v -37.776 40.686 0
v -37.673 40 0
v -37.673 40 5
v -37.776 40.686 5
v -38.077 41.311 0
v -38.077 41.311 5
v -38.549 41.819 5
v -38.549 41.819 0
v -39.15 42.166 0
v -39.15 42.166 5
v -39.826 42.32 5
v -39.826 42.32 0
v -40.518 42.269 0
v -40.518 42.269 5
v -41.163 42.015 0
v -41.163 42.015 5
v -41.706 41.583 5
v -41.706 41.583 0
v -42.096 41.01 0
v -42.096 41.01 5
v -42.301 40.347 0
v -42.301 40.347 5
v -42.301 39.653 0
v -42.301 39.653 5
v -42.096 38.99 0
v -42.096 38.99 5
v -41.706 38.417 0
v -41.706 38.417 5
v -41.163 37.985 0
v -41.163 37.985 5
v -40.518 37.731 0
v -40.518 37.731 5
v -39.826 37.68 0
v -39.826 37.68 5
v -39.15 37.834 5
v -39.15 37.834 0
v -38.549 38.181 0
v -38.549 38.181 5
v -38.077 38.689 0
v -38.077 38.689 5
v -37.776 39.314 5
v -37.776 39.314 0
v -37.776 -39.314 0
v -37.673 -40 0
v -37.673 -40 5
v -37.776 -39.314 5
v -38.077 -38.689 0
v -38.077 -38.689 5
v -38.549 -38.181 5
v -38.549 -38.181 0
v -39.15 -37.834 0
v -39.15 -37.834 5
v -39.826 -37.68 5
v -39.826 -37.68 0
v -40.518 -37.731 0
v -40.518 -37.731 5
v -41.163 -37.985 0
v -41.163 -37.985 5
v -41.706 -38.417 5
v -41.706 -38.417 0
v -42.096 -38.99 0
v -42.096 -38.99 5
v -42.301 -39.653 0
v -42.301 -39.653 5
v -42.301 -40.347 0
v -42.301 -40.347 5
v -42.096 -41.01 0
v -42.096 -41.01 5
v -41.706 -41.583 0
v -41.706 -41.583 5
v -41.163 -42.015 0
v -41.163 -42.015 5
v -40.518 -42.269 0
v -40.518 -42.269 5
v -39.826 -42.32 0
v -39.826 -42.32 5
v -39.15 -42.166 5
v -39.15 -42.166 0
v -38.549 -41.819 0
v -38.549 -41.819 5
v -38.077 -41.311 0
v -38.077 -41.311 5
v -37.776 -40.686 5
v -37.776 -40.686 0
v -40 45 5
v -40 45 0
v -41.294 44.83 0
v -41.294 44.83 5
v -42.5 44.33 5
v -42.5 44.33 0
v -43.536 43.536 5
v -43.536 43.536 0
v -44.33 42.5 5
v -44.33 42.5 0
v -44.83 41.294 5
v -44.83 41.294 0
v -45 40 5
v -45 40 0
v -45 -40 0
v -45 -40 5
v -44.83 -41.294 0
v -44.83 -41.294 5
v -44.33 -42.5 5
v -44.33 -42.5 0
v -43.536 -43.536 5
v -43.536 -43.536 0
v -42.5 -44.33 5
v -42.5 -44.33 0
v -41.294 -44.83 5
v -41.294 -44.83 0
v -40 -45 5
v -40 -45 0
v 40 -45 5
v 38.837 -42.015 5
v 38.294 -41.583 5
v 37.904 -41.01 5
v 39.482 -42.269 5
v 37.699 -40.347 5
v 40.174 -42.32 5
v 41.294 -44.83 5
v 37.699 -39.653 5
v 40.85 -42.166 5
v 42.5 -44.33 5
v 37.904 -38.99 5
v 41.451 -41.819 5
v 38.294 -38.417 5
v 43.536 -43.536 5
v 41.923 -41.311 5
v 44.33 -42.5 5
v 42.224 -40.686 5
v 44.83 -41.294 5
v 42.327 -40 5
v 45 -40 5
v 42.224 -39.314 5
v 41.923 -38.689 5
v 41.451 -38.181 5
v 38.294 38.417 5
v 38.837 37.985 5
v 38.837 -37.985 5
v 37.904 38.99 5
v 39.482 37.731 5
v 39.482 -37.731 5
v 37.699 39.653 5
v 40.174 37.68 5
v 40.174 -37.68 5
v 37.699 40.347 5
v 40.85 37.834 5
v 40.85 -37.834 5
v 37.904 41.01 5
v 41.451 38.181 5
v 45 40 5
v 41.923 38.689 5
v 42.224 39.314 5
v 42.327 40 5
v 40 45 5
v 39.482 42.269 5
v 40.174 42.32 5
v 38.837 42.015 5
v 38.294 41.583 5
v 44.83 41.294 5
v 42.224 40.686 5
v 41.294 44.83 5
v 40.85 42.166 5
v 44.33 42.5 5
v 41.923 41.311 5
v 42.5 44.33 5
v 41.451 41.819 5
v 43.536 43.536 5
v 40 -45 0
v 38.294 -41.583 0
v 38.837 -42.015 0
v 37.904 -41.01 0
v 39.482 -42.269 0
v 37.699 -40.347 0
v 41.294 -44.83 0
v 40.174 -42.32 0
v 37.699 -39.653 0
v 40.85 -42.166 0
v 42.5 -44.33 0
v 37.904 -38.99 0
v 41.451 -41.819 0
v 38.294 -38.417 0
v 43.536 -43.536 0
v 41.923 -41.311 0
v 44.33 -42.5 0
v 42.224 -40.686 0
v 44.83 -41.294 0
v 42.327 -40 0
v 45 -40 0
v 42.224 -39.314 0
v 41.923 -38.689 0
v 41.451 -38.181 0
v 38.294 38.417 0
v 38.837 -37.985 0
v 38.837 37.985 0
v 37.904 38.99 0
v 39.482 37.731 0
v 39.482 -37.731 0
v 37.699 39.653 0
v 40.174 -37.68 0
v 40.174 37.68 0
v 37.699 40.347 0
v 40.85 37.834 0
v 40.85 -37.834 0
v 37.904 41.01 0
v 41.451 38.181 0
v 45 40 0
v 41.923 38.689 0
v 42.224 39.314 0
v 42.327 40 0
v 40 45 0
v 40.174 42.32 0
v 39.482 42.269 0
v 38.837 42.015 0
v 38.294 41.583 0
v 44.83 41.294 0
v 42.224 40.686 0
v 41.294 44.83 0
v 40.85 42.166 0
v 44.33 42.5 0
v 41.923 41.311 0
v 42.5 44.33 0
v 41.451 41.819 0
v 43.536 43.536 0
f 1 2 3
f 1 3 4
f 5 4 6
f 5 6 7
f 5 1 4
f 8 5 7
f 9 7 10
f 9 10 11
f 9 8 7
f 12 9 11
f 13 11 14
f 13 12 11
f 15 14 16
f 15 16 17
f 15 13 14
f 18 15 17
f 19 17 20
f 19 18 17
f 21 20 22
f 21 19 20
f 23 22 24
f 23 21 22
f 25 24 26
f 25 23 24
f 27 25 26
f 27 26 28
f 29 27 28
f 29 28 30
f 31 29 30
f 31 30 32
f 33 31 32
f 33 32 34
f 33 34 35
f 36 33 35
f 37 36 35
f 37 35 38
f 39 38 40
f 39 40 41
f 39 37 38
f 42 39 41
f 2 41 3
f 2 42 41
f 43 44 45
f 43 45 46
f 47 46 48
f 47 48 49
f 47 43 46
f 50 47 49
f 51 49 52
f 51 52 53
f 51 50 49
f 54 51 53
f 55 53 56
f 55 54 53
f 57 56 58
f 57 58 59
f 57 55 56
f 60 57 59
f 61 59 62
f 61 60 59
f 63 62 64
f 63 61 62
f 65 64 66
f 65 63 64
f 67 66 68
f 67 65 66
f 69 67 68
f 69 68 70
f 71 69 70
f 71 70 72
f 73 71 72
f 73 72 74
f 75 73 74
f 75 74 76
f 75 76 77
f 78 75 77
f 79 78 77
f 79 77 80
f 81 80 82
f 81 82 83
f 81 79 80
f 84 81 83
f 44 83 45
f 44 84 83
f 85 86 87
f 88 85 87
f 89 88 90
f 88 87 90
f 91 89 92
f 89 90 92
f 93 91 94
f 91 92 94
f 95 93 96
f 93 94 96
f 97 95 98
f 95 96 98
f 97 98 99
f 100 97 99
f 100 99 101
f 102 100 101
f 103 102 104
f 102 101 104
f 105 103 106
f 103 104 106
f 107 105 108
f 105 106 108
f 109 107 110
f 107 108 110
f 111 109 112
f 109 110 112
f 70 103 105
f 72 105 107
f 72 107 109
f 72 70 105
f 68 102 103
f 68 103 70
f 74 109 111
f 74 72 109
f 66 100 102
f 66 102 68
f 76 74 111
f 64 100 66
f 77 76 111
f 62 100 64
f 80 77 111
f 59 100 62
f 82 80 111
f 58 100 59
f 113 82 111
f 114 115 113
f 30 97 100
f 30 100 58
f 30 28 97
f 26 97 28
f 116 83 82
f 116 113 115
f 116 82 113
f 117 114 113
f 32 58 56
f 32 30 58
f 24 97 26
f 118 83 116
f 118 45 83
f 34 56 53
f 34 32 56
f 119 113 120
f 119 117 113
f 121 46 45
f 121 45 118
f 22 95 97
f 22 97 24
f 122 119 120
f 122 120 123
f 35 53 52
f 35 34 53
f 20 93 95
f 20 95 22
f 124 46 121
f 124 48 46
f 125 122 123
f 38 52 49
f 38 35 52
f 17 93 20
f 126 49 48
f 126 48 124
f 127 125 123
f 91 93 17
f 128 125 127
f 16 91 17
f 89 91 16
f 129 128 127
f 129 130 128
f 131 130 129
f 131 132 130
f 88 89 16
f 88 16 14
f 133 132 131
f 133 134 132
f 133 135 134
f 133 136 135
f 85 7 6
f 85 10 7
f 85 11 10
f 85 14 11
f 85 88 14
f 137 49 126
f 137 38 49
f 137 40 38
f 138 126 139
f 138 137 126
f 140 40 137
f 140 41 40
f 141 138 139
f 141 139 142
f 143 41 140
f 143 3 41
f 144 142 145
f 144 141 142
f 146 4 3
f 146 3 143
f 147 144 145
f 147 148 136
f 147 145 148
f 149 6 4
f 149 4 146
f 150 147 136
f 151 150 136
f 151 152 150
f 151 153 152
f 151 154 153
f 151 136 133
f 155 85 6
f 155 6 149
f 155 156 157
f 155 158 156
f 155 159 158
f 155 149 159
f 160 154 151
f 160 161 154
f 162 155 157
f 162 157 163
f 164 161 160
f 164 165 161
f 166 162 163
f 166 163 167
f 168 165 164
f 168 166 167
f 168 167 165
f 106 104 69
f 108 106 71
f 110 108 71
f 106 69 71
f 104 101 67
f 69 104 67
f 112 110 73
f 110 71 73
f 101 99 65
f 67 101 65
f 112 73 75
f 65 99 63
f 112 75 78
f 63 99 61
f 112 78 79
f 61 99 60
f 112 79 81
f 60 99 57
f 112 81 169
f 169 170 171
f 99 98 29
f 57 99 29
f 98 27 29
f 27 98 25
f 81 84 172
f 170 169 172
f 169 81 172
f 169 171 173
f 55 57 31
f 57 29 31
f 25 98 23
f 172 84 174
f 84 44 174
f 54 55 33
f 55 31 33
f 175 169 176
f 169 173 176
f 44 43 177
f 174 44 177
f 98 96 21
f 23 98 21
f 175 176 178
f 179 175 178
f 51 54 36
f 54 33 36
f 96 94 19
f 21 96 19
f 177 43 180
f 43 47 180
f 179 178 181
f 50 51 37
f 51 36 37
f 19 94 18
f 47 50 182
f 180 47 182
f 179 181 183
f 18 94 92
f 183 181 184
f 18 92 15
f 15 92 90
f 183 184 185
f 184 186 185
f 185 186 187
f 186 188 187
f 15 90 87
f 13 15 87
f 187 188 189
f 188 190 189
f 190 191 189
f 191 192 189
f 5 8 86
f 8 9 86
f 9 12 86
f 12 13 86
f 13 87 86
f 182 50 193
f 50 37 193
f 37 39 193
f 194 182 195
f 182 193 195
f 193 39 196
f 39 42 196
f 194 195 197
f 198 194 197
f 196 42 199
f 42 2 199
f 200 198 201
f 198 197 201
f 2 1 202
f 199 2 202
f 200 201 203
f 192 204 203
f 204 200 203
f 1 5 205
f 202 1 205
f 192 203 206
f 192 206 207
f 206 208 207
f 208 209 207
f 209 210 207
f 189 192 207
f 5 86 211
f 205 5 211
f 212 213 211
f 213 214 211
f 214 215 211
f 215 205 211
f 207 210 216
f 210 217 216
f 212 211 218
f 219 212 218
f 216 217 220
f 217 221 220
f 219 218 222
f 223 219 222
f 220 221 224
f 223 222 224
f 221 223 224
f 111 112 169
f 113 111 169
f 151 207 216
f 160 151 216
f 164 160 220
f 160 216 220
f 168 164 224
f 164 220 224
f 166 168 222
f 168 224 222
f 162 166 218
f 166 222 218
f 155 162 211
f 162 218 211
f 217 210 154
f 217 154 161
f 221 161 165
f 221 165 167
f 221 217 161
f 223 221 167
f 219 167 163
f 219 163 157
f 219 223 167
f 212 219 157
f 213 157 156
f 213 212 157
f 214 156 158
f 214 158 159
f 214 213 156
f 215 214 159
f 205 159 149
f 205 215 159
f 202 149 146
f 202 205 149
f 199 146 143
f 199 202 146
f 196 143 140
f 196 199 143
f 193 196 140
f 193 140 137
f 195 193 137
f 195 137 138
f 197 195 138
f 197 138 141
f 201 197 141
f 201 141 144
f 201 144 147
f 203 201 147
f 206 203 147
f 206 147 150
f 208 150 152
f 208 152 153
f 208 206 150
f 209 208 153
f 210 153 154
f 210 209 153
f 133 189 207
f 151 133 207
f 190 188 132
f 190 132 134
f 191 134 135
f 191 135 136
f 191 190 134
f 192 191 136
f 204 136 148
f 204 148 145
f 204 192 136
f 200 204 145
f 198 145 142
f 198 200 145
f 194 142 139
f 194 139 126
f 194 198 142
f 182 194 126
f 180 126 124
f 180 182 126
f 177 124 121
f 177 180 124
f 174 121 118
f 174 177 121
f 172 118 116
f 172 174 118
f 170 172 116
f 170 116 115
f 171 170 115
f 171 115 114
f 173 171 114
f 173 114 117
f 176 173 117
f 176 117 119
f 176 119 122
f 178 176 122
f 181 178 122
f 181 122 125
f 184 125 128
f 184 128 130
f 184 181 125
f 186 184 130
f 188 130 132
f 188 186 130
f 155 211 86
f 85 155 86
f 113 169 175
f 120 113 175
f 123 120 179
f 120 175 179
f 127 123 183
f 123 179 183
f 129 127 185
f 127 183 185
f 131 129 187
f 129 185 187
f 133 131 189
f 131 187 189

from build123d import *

# Parameters (mm, degrees)
F0_R     = 2.326918
F1_DEPTH = 5


with BuildPart() as f1:
    # F0 (on Top) → F1 (new body)
    with BuildSketch(Plane.XY):
        with BuildLine():
            Line((40, 45), (-40, 45))
            ThreePointArc((-40, 45), (-43.535534, 43.535534), (-45, 40))
            Line((-45, 40), (-45, -40))
            ThreePointArc((-45, -40), (-43.535534, -43.535534), (-40, -45))
            Line((-40, -45), (40, -45))
            ThreePointArc((40, -45), (43.535534, -43.535534), (45, -40))
            Line((45, -40), (45, 40))
            ThreePointArc((45, 40), (43.535534, 43.535534), (40, 45))
        make_face()
        with Locations((-40, -40)):
            Circle(F0_R, mode=Mode.SUBTRACT)
        with Locations((40, -40)):
            Circle(F0_R, mode=Mode.SUBTRACT)
        with Locations((-40, 40)):
            Circle(F0_R, mode=Mode.SUBTRACT)
        with BuildLine():
            ThreePointArc((-39.163858, 36.739757), (-37.518478, 37.421295), (-36.836939, 39.066675))
            Line((-36.836939, 39.066675), (36.836939, 39.066675))
            ThreePointArc((36.836939, 39.066675), (37.518478, 37.421295), (39.163858, 36.739757))
            Line((39.163858, 36.739757), (39.163858, -36.739757))
            ThreePointArc((39.163858, -36.739757), (37.518478, -37.421295), (36.836939, -39.066675))
            Line((36.836939, -39.066675), (-36.836939, -39.066675))
            ThreePointArc((-36.836939, -39.066675), (-37.518478, -37.421295), (-39.163858, -36.739757))
            Line((-39.163858, -36.739757), (-39.163858, 36.739757))
        make_face(mode=Mode.SUBTRACT)
        with Locations((40, 40)):
            Circle(F0_R, mode=Mode.SUBTRACT)
        with BuildLine():
            Line((36.836939, 39.066675), (-36.836939, 39.066675))
            ThreePointArc((-36.836939, 39.066675), (-37.518478, 37.421295), (-39.163858, 36.739757))
            Line((-39.163858, 36.739757), (-39.163858, -36.739757))
            ThreePointArc((-39.163858, -36.739757), (-37.518478, -37.421295), (-36.836939, -39.066675))
            Line((-36.836939, -39.066675), (36.836939, -39.066675))
            ThreePointArc((36.836939, -39.066675), (37.518478, -37.421295), (39.163858, -36.739757))
            Line((39.163858, -36.739757), (39.163858, 36.739757))
            ThreePointArc((39.163858, 36.739757), (37.518478, 37.421295), (36.836939, 39.066675))
        make_face()
    extrude(amount=F1_DEPTH)


solid = f1.part
